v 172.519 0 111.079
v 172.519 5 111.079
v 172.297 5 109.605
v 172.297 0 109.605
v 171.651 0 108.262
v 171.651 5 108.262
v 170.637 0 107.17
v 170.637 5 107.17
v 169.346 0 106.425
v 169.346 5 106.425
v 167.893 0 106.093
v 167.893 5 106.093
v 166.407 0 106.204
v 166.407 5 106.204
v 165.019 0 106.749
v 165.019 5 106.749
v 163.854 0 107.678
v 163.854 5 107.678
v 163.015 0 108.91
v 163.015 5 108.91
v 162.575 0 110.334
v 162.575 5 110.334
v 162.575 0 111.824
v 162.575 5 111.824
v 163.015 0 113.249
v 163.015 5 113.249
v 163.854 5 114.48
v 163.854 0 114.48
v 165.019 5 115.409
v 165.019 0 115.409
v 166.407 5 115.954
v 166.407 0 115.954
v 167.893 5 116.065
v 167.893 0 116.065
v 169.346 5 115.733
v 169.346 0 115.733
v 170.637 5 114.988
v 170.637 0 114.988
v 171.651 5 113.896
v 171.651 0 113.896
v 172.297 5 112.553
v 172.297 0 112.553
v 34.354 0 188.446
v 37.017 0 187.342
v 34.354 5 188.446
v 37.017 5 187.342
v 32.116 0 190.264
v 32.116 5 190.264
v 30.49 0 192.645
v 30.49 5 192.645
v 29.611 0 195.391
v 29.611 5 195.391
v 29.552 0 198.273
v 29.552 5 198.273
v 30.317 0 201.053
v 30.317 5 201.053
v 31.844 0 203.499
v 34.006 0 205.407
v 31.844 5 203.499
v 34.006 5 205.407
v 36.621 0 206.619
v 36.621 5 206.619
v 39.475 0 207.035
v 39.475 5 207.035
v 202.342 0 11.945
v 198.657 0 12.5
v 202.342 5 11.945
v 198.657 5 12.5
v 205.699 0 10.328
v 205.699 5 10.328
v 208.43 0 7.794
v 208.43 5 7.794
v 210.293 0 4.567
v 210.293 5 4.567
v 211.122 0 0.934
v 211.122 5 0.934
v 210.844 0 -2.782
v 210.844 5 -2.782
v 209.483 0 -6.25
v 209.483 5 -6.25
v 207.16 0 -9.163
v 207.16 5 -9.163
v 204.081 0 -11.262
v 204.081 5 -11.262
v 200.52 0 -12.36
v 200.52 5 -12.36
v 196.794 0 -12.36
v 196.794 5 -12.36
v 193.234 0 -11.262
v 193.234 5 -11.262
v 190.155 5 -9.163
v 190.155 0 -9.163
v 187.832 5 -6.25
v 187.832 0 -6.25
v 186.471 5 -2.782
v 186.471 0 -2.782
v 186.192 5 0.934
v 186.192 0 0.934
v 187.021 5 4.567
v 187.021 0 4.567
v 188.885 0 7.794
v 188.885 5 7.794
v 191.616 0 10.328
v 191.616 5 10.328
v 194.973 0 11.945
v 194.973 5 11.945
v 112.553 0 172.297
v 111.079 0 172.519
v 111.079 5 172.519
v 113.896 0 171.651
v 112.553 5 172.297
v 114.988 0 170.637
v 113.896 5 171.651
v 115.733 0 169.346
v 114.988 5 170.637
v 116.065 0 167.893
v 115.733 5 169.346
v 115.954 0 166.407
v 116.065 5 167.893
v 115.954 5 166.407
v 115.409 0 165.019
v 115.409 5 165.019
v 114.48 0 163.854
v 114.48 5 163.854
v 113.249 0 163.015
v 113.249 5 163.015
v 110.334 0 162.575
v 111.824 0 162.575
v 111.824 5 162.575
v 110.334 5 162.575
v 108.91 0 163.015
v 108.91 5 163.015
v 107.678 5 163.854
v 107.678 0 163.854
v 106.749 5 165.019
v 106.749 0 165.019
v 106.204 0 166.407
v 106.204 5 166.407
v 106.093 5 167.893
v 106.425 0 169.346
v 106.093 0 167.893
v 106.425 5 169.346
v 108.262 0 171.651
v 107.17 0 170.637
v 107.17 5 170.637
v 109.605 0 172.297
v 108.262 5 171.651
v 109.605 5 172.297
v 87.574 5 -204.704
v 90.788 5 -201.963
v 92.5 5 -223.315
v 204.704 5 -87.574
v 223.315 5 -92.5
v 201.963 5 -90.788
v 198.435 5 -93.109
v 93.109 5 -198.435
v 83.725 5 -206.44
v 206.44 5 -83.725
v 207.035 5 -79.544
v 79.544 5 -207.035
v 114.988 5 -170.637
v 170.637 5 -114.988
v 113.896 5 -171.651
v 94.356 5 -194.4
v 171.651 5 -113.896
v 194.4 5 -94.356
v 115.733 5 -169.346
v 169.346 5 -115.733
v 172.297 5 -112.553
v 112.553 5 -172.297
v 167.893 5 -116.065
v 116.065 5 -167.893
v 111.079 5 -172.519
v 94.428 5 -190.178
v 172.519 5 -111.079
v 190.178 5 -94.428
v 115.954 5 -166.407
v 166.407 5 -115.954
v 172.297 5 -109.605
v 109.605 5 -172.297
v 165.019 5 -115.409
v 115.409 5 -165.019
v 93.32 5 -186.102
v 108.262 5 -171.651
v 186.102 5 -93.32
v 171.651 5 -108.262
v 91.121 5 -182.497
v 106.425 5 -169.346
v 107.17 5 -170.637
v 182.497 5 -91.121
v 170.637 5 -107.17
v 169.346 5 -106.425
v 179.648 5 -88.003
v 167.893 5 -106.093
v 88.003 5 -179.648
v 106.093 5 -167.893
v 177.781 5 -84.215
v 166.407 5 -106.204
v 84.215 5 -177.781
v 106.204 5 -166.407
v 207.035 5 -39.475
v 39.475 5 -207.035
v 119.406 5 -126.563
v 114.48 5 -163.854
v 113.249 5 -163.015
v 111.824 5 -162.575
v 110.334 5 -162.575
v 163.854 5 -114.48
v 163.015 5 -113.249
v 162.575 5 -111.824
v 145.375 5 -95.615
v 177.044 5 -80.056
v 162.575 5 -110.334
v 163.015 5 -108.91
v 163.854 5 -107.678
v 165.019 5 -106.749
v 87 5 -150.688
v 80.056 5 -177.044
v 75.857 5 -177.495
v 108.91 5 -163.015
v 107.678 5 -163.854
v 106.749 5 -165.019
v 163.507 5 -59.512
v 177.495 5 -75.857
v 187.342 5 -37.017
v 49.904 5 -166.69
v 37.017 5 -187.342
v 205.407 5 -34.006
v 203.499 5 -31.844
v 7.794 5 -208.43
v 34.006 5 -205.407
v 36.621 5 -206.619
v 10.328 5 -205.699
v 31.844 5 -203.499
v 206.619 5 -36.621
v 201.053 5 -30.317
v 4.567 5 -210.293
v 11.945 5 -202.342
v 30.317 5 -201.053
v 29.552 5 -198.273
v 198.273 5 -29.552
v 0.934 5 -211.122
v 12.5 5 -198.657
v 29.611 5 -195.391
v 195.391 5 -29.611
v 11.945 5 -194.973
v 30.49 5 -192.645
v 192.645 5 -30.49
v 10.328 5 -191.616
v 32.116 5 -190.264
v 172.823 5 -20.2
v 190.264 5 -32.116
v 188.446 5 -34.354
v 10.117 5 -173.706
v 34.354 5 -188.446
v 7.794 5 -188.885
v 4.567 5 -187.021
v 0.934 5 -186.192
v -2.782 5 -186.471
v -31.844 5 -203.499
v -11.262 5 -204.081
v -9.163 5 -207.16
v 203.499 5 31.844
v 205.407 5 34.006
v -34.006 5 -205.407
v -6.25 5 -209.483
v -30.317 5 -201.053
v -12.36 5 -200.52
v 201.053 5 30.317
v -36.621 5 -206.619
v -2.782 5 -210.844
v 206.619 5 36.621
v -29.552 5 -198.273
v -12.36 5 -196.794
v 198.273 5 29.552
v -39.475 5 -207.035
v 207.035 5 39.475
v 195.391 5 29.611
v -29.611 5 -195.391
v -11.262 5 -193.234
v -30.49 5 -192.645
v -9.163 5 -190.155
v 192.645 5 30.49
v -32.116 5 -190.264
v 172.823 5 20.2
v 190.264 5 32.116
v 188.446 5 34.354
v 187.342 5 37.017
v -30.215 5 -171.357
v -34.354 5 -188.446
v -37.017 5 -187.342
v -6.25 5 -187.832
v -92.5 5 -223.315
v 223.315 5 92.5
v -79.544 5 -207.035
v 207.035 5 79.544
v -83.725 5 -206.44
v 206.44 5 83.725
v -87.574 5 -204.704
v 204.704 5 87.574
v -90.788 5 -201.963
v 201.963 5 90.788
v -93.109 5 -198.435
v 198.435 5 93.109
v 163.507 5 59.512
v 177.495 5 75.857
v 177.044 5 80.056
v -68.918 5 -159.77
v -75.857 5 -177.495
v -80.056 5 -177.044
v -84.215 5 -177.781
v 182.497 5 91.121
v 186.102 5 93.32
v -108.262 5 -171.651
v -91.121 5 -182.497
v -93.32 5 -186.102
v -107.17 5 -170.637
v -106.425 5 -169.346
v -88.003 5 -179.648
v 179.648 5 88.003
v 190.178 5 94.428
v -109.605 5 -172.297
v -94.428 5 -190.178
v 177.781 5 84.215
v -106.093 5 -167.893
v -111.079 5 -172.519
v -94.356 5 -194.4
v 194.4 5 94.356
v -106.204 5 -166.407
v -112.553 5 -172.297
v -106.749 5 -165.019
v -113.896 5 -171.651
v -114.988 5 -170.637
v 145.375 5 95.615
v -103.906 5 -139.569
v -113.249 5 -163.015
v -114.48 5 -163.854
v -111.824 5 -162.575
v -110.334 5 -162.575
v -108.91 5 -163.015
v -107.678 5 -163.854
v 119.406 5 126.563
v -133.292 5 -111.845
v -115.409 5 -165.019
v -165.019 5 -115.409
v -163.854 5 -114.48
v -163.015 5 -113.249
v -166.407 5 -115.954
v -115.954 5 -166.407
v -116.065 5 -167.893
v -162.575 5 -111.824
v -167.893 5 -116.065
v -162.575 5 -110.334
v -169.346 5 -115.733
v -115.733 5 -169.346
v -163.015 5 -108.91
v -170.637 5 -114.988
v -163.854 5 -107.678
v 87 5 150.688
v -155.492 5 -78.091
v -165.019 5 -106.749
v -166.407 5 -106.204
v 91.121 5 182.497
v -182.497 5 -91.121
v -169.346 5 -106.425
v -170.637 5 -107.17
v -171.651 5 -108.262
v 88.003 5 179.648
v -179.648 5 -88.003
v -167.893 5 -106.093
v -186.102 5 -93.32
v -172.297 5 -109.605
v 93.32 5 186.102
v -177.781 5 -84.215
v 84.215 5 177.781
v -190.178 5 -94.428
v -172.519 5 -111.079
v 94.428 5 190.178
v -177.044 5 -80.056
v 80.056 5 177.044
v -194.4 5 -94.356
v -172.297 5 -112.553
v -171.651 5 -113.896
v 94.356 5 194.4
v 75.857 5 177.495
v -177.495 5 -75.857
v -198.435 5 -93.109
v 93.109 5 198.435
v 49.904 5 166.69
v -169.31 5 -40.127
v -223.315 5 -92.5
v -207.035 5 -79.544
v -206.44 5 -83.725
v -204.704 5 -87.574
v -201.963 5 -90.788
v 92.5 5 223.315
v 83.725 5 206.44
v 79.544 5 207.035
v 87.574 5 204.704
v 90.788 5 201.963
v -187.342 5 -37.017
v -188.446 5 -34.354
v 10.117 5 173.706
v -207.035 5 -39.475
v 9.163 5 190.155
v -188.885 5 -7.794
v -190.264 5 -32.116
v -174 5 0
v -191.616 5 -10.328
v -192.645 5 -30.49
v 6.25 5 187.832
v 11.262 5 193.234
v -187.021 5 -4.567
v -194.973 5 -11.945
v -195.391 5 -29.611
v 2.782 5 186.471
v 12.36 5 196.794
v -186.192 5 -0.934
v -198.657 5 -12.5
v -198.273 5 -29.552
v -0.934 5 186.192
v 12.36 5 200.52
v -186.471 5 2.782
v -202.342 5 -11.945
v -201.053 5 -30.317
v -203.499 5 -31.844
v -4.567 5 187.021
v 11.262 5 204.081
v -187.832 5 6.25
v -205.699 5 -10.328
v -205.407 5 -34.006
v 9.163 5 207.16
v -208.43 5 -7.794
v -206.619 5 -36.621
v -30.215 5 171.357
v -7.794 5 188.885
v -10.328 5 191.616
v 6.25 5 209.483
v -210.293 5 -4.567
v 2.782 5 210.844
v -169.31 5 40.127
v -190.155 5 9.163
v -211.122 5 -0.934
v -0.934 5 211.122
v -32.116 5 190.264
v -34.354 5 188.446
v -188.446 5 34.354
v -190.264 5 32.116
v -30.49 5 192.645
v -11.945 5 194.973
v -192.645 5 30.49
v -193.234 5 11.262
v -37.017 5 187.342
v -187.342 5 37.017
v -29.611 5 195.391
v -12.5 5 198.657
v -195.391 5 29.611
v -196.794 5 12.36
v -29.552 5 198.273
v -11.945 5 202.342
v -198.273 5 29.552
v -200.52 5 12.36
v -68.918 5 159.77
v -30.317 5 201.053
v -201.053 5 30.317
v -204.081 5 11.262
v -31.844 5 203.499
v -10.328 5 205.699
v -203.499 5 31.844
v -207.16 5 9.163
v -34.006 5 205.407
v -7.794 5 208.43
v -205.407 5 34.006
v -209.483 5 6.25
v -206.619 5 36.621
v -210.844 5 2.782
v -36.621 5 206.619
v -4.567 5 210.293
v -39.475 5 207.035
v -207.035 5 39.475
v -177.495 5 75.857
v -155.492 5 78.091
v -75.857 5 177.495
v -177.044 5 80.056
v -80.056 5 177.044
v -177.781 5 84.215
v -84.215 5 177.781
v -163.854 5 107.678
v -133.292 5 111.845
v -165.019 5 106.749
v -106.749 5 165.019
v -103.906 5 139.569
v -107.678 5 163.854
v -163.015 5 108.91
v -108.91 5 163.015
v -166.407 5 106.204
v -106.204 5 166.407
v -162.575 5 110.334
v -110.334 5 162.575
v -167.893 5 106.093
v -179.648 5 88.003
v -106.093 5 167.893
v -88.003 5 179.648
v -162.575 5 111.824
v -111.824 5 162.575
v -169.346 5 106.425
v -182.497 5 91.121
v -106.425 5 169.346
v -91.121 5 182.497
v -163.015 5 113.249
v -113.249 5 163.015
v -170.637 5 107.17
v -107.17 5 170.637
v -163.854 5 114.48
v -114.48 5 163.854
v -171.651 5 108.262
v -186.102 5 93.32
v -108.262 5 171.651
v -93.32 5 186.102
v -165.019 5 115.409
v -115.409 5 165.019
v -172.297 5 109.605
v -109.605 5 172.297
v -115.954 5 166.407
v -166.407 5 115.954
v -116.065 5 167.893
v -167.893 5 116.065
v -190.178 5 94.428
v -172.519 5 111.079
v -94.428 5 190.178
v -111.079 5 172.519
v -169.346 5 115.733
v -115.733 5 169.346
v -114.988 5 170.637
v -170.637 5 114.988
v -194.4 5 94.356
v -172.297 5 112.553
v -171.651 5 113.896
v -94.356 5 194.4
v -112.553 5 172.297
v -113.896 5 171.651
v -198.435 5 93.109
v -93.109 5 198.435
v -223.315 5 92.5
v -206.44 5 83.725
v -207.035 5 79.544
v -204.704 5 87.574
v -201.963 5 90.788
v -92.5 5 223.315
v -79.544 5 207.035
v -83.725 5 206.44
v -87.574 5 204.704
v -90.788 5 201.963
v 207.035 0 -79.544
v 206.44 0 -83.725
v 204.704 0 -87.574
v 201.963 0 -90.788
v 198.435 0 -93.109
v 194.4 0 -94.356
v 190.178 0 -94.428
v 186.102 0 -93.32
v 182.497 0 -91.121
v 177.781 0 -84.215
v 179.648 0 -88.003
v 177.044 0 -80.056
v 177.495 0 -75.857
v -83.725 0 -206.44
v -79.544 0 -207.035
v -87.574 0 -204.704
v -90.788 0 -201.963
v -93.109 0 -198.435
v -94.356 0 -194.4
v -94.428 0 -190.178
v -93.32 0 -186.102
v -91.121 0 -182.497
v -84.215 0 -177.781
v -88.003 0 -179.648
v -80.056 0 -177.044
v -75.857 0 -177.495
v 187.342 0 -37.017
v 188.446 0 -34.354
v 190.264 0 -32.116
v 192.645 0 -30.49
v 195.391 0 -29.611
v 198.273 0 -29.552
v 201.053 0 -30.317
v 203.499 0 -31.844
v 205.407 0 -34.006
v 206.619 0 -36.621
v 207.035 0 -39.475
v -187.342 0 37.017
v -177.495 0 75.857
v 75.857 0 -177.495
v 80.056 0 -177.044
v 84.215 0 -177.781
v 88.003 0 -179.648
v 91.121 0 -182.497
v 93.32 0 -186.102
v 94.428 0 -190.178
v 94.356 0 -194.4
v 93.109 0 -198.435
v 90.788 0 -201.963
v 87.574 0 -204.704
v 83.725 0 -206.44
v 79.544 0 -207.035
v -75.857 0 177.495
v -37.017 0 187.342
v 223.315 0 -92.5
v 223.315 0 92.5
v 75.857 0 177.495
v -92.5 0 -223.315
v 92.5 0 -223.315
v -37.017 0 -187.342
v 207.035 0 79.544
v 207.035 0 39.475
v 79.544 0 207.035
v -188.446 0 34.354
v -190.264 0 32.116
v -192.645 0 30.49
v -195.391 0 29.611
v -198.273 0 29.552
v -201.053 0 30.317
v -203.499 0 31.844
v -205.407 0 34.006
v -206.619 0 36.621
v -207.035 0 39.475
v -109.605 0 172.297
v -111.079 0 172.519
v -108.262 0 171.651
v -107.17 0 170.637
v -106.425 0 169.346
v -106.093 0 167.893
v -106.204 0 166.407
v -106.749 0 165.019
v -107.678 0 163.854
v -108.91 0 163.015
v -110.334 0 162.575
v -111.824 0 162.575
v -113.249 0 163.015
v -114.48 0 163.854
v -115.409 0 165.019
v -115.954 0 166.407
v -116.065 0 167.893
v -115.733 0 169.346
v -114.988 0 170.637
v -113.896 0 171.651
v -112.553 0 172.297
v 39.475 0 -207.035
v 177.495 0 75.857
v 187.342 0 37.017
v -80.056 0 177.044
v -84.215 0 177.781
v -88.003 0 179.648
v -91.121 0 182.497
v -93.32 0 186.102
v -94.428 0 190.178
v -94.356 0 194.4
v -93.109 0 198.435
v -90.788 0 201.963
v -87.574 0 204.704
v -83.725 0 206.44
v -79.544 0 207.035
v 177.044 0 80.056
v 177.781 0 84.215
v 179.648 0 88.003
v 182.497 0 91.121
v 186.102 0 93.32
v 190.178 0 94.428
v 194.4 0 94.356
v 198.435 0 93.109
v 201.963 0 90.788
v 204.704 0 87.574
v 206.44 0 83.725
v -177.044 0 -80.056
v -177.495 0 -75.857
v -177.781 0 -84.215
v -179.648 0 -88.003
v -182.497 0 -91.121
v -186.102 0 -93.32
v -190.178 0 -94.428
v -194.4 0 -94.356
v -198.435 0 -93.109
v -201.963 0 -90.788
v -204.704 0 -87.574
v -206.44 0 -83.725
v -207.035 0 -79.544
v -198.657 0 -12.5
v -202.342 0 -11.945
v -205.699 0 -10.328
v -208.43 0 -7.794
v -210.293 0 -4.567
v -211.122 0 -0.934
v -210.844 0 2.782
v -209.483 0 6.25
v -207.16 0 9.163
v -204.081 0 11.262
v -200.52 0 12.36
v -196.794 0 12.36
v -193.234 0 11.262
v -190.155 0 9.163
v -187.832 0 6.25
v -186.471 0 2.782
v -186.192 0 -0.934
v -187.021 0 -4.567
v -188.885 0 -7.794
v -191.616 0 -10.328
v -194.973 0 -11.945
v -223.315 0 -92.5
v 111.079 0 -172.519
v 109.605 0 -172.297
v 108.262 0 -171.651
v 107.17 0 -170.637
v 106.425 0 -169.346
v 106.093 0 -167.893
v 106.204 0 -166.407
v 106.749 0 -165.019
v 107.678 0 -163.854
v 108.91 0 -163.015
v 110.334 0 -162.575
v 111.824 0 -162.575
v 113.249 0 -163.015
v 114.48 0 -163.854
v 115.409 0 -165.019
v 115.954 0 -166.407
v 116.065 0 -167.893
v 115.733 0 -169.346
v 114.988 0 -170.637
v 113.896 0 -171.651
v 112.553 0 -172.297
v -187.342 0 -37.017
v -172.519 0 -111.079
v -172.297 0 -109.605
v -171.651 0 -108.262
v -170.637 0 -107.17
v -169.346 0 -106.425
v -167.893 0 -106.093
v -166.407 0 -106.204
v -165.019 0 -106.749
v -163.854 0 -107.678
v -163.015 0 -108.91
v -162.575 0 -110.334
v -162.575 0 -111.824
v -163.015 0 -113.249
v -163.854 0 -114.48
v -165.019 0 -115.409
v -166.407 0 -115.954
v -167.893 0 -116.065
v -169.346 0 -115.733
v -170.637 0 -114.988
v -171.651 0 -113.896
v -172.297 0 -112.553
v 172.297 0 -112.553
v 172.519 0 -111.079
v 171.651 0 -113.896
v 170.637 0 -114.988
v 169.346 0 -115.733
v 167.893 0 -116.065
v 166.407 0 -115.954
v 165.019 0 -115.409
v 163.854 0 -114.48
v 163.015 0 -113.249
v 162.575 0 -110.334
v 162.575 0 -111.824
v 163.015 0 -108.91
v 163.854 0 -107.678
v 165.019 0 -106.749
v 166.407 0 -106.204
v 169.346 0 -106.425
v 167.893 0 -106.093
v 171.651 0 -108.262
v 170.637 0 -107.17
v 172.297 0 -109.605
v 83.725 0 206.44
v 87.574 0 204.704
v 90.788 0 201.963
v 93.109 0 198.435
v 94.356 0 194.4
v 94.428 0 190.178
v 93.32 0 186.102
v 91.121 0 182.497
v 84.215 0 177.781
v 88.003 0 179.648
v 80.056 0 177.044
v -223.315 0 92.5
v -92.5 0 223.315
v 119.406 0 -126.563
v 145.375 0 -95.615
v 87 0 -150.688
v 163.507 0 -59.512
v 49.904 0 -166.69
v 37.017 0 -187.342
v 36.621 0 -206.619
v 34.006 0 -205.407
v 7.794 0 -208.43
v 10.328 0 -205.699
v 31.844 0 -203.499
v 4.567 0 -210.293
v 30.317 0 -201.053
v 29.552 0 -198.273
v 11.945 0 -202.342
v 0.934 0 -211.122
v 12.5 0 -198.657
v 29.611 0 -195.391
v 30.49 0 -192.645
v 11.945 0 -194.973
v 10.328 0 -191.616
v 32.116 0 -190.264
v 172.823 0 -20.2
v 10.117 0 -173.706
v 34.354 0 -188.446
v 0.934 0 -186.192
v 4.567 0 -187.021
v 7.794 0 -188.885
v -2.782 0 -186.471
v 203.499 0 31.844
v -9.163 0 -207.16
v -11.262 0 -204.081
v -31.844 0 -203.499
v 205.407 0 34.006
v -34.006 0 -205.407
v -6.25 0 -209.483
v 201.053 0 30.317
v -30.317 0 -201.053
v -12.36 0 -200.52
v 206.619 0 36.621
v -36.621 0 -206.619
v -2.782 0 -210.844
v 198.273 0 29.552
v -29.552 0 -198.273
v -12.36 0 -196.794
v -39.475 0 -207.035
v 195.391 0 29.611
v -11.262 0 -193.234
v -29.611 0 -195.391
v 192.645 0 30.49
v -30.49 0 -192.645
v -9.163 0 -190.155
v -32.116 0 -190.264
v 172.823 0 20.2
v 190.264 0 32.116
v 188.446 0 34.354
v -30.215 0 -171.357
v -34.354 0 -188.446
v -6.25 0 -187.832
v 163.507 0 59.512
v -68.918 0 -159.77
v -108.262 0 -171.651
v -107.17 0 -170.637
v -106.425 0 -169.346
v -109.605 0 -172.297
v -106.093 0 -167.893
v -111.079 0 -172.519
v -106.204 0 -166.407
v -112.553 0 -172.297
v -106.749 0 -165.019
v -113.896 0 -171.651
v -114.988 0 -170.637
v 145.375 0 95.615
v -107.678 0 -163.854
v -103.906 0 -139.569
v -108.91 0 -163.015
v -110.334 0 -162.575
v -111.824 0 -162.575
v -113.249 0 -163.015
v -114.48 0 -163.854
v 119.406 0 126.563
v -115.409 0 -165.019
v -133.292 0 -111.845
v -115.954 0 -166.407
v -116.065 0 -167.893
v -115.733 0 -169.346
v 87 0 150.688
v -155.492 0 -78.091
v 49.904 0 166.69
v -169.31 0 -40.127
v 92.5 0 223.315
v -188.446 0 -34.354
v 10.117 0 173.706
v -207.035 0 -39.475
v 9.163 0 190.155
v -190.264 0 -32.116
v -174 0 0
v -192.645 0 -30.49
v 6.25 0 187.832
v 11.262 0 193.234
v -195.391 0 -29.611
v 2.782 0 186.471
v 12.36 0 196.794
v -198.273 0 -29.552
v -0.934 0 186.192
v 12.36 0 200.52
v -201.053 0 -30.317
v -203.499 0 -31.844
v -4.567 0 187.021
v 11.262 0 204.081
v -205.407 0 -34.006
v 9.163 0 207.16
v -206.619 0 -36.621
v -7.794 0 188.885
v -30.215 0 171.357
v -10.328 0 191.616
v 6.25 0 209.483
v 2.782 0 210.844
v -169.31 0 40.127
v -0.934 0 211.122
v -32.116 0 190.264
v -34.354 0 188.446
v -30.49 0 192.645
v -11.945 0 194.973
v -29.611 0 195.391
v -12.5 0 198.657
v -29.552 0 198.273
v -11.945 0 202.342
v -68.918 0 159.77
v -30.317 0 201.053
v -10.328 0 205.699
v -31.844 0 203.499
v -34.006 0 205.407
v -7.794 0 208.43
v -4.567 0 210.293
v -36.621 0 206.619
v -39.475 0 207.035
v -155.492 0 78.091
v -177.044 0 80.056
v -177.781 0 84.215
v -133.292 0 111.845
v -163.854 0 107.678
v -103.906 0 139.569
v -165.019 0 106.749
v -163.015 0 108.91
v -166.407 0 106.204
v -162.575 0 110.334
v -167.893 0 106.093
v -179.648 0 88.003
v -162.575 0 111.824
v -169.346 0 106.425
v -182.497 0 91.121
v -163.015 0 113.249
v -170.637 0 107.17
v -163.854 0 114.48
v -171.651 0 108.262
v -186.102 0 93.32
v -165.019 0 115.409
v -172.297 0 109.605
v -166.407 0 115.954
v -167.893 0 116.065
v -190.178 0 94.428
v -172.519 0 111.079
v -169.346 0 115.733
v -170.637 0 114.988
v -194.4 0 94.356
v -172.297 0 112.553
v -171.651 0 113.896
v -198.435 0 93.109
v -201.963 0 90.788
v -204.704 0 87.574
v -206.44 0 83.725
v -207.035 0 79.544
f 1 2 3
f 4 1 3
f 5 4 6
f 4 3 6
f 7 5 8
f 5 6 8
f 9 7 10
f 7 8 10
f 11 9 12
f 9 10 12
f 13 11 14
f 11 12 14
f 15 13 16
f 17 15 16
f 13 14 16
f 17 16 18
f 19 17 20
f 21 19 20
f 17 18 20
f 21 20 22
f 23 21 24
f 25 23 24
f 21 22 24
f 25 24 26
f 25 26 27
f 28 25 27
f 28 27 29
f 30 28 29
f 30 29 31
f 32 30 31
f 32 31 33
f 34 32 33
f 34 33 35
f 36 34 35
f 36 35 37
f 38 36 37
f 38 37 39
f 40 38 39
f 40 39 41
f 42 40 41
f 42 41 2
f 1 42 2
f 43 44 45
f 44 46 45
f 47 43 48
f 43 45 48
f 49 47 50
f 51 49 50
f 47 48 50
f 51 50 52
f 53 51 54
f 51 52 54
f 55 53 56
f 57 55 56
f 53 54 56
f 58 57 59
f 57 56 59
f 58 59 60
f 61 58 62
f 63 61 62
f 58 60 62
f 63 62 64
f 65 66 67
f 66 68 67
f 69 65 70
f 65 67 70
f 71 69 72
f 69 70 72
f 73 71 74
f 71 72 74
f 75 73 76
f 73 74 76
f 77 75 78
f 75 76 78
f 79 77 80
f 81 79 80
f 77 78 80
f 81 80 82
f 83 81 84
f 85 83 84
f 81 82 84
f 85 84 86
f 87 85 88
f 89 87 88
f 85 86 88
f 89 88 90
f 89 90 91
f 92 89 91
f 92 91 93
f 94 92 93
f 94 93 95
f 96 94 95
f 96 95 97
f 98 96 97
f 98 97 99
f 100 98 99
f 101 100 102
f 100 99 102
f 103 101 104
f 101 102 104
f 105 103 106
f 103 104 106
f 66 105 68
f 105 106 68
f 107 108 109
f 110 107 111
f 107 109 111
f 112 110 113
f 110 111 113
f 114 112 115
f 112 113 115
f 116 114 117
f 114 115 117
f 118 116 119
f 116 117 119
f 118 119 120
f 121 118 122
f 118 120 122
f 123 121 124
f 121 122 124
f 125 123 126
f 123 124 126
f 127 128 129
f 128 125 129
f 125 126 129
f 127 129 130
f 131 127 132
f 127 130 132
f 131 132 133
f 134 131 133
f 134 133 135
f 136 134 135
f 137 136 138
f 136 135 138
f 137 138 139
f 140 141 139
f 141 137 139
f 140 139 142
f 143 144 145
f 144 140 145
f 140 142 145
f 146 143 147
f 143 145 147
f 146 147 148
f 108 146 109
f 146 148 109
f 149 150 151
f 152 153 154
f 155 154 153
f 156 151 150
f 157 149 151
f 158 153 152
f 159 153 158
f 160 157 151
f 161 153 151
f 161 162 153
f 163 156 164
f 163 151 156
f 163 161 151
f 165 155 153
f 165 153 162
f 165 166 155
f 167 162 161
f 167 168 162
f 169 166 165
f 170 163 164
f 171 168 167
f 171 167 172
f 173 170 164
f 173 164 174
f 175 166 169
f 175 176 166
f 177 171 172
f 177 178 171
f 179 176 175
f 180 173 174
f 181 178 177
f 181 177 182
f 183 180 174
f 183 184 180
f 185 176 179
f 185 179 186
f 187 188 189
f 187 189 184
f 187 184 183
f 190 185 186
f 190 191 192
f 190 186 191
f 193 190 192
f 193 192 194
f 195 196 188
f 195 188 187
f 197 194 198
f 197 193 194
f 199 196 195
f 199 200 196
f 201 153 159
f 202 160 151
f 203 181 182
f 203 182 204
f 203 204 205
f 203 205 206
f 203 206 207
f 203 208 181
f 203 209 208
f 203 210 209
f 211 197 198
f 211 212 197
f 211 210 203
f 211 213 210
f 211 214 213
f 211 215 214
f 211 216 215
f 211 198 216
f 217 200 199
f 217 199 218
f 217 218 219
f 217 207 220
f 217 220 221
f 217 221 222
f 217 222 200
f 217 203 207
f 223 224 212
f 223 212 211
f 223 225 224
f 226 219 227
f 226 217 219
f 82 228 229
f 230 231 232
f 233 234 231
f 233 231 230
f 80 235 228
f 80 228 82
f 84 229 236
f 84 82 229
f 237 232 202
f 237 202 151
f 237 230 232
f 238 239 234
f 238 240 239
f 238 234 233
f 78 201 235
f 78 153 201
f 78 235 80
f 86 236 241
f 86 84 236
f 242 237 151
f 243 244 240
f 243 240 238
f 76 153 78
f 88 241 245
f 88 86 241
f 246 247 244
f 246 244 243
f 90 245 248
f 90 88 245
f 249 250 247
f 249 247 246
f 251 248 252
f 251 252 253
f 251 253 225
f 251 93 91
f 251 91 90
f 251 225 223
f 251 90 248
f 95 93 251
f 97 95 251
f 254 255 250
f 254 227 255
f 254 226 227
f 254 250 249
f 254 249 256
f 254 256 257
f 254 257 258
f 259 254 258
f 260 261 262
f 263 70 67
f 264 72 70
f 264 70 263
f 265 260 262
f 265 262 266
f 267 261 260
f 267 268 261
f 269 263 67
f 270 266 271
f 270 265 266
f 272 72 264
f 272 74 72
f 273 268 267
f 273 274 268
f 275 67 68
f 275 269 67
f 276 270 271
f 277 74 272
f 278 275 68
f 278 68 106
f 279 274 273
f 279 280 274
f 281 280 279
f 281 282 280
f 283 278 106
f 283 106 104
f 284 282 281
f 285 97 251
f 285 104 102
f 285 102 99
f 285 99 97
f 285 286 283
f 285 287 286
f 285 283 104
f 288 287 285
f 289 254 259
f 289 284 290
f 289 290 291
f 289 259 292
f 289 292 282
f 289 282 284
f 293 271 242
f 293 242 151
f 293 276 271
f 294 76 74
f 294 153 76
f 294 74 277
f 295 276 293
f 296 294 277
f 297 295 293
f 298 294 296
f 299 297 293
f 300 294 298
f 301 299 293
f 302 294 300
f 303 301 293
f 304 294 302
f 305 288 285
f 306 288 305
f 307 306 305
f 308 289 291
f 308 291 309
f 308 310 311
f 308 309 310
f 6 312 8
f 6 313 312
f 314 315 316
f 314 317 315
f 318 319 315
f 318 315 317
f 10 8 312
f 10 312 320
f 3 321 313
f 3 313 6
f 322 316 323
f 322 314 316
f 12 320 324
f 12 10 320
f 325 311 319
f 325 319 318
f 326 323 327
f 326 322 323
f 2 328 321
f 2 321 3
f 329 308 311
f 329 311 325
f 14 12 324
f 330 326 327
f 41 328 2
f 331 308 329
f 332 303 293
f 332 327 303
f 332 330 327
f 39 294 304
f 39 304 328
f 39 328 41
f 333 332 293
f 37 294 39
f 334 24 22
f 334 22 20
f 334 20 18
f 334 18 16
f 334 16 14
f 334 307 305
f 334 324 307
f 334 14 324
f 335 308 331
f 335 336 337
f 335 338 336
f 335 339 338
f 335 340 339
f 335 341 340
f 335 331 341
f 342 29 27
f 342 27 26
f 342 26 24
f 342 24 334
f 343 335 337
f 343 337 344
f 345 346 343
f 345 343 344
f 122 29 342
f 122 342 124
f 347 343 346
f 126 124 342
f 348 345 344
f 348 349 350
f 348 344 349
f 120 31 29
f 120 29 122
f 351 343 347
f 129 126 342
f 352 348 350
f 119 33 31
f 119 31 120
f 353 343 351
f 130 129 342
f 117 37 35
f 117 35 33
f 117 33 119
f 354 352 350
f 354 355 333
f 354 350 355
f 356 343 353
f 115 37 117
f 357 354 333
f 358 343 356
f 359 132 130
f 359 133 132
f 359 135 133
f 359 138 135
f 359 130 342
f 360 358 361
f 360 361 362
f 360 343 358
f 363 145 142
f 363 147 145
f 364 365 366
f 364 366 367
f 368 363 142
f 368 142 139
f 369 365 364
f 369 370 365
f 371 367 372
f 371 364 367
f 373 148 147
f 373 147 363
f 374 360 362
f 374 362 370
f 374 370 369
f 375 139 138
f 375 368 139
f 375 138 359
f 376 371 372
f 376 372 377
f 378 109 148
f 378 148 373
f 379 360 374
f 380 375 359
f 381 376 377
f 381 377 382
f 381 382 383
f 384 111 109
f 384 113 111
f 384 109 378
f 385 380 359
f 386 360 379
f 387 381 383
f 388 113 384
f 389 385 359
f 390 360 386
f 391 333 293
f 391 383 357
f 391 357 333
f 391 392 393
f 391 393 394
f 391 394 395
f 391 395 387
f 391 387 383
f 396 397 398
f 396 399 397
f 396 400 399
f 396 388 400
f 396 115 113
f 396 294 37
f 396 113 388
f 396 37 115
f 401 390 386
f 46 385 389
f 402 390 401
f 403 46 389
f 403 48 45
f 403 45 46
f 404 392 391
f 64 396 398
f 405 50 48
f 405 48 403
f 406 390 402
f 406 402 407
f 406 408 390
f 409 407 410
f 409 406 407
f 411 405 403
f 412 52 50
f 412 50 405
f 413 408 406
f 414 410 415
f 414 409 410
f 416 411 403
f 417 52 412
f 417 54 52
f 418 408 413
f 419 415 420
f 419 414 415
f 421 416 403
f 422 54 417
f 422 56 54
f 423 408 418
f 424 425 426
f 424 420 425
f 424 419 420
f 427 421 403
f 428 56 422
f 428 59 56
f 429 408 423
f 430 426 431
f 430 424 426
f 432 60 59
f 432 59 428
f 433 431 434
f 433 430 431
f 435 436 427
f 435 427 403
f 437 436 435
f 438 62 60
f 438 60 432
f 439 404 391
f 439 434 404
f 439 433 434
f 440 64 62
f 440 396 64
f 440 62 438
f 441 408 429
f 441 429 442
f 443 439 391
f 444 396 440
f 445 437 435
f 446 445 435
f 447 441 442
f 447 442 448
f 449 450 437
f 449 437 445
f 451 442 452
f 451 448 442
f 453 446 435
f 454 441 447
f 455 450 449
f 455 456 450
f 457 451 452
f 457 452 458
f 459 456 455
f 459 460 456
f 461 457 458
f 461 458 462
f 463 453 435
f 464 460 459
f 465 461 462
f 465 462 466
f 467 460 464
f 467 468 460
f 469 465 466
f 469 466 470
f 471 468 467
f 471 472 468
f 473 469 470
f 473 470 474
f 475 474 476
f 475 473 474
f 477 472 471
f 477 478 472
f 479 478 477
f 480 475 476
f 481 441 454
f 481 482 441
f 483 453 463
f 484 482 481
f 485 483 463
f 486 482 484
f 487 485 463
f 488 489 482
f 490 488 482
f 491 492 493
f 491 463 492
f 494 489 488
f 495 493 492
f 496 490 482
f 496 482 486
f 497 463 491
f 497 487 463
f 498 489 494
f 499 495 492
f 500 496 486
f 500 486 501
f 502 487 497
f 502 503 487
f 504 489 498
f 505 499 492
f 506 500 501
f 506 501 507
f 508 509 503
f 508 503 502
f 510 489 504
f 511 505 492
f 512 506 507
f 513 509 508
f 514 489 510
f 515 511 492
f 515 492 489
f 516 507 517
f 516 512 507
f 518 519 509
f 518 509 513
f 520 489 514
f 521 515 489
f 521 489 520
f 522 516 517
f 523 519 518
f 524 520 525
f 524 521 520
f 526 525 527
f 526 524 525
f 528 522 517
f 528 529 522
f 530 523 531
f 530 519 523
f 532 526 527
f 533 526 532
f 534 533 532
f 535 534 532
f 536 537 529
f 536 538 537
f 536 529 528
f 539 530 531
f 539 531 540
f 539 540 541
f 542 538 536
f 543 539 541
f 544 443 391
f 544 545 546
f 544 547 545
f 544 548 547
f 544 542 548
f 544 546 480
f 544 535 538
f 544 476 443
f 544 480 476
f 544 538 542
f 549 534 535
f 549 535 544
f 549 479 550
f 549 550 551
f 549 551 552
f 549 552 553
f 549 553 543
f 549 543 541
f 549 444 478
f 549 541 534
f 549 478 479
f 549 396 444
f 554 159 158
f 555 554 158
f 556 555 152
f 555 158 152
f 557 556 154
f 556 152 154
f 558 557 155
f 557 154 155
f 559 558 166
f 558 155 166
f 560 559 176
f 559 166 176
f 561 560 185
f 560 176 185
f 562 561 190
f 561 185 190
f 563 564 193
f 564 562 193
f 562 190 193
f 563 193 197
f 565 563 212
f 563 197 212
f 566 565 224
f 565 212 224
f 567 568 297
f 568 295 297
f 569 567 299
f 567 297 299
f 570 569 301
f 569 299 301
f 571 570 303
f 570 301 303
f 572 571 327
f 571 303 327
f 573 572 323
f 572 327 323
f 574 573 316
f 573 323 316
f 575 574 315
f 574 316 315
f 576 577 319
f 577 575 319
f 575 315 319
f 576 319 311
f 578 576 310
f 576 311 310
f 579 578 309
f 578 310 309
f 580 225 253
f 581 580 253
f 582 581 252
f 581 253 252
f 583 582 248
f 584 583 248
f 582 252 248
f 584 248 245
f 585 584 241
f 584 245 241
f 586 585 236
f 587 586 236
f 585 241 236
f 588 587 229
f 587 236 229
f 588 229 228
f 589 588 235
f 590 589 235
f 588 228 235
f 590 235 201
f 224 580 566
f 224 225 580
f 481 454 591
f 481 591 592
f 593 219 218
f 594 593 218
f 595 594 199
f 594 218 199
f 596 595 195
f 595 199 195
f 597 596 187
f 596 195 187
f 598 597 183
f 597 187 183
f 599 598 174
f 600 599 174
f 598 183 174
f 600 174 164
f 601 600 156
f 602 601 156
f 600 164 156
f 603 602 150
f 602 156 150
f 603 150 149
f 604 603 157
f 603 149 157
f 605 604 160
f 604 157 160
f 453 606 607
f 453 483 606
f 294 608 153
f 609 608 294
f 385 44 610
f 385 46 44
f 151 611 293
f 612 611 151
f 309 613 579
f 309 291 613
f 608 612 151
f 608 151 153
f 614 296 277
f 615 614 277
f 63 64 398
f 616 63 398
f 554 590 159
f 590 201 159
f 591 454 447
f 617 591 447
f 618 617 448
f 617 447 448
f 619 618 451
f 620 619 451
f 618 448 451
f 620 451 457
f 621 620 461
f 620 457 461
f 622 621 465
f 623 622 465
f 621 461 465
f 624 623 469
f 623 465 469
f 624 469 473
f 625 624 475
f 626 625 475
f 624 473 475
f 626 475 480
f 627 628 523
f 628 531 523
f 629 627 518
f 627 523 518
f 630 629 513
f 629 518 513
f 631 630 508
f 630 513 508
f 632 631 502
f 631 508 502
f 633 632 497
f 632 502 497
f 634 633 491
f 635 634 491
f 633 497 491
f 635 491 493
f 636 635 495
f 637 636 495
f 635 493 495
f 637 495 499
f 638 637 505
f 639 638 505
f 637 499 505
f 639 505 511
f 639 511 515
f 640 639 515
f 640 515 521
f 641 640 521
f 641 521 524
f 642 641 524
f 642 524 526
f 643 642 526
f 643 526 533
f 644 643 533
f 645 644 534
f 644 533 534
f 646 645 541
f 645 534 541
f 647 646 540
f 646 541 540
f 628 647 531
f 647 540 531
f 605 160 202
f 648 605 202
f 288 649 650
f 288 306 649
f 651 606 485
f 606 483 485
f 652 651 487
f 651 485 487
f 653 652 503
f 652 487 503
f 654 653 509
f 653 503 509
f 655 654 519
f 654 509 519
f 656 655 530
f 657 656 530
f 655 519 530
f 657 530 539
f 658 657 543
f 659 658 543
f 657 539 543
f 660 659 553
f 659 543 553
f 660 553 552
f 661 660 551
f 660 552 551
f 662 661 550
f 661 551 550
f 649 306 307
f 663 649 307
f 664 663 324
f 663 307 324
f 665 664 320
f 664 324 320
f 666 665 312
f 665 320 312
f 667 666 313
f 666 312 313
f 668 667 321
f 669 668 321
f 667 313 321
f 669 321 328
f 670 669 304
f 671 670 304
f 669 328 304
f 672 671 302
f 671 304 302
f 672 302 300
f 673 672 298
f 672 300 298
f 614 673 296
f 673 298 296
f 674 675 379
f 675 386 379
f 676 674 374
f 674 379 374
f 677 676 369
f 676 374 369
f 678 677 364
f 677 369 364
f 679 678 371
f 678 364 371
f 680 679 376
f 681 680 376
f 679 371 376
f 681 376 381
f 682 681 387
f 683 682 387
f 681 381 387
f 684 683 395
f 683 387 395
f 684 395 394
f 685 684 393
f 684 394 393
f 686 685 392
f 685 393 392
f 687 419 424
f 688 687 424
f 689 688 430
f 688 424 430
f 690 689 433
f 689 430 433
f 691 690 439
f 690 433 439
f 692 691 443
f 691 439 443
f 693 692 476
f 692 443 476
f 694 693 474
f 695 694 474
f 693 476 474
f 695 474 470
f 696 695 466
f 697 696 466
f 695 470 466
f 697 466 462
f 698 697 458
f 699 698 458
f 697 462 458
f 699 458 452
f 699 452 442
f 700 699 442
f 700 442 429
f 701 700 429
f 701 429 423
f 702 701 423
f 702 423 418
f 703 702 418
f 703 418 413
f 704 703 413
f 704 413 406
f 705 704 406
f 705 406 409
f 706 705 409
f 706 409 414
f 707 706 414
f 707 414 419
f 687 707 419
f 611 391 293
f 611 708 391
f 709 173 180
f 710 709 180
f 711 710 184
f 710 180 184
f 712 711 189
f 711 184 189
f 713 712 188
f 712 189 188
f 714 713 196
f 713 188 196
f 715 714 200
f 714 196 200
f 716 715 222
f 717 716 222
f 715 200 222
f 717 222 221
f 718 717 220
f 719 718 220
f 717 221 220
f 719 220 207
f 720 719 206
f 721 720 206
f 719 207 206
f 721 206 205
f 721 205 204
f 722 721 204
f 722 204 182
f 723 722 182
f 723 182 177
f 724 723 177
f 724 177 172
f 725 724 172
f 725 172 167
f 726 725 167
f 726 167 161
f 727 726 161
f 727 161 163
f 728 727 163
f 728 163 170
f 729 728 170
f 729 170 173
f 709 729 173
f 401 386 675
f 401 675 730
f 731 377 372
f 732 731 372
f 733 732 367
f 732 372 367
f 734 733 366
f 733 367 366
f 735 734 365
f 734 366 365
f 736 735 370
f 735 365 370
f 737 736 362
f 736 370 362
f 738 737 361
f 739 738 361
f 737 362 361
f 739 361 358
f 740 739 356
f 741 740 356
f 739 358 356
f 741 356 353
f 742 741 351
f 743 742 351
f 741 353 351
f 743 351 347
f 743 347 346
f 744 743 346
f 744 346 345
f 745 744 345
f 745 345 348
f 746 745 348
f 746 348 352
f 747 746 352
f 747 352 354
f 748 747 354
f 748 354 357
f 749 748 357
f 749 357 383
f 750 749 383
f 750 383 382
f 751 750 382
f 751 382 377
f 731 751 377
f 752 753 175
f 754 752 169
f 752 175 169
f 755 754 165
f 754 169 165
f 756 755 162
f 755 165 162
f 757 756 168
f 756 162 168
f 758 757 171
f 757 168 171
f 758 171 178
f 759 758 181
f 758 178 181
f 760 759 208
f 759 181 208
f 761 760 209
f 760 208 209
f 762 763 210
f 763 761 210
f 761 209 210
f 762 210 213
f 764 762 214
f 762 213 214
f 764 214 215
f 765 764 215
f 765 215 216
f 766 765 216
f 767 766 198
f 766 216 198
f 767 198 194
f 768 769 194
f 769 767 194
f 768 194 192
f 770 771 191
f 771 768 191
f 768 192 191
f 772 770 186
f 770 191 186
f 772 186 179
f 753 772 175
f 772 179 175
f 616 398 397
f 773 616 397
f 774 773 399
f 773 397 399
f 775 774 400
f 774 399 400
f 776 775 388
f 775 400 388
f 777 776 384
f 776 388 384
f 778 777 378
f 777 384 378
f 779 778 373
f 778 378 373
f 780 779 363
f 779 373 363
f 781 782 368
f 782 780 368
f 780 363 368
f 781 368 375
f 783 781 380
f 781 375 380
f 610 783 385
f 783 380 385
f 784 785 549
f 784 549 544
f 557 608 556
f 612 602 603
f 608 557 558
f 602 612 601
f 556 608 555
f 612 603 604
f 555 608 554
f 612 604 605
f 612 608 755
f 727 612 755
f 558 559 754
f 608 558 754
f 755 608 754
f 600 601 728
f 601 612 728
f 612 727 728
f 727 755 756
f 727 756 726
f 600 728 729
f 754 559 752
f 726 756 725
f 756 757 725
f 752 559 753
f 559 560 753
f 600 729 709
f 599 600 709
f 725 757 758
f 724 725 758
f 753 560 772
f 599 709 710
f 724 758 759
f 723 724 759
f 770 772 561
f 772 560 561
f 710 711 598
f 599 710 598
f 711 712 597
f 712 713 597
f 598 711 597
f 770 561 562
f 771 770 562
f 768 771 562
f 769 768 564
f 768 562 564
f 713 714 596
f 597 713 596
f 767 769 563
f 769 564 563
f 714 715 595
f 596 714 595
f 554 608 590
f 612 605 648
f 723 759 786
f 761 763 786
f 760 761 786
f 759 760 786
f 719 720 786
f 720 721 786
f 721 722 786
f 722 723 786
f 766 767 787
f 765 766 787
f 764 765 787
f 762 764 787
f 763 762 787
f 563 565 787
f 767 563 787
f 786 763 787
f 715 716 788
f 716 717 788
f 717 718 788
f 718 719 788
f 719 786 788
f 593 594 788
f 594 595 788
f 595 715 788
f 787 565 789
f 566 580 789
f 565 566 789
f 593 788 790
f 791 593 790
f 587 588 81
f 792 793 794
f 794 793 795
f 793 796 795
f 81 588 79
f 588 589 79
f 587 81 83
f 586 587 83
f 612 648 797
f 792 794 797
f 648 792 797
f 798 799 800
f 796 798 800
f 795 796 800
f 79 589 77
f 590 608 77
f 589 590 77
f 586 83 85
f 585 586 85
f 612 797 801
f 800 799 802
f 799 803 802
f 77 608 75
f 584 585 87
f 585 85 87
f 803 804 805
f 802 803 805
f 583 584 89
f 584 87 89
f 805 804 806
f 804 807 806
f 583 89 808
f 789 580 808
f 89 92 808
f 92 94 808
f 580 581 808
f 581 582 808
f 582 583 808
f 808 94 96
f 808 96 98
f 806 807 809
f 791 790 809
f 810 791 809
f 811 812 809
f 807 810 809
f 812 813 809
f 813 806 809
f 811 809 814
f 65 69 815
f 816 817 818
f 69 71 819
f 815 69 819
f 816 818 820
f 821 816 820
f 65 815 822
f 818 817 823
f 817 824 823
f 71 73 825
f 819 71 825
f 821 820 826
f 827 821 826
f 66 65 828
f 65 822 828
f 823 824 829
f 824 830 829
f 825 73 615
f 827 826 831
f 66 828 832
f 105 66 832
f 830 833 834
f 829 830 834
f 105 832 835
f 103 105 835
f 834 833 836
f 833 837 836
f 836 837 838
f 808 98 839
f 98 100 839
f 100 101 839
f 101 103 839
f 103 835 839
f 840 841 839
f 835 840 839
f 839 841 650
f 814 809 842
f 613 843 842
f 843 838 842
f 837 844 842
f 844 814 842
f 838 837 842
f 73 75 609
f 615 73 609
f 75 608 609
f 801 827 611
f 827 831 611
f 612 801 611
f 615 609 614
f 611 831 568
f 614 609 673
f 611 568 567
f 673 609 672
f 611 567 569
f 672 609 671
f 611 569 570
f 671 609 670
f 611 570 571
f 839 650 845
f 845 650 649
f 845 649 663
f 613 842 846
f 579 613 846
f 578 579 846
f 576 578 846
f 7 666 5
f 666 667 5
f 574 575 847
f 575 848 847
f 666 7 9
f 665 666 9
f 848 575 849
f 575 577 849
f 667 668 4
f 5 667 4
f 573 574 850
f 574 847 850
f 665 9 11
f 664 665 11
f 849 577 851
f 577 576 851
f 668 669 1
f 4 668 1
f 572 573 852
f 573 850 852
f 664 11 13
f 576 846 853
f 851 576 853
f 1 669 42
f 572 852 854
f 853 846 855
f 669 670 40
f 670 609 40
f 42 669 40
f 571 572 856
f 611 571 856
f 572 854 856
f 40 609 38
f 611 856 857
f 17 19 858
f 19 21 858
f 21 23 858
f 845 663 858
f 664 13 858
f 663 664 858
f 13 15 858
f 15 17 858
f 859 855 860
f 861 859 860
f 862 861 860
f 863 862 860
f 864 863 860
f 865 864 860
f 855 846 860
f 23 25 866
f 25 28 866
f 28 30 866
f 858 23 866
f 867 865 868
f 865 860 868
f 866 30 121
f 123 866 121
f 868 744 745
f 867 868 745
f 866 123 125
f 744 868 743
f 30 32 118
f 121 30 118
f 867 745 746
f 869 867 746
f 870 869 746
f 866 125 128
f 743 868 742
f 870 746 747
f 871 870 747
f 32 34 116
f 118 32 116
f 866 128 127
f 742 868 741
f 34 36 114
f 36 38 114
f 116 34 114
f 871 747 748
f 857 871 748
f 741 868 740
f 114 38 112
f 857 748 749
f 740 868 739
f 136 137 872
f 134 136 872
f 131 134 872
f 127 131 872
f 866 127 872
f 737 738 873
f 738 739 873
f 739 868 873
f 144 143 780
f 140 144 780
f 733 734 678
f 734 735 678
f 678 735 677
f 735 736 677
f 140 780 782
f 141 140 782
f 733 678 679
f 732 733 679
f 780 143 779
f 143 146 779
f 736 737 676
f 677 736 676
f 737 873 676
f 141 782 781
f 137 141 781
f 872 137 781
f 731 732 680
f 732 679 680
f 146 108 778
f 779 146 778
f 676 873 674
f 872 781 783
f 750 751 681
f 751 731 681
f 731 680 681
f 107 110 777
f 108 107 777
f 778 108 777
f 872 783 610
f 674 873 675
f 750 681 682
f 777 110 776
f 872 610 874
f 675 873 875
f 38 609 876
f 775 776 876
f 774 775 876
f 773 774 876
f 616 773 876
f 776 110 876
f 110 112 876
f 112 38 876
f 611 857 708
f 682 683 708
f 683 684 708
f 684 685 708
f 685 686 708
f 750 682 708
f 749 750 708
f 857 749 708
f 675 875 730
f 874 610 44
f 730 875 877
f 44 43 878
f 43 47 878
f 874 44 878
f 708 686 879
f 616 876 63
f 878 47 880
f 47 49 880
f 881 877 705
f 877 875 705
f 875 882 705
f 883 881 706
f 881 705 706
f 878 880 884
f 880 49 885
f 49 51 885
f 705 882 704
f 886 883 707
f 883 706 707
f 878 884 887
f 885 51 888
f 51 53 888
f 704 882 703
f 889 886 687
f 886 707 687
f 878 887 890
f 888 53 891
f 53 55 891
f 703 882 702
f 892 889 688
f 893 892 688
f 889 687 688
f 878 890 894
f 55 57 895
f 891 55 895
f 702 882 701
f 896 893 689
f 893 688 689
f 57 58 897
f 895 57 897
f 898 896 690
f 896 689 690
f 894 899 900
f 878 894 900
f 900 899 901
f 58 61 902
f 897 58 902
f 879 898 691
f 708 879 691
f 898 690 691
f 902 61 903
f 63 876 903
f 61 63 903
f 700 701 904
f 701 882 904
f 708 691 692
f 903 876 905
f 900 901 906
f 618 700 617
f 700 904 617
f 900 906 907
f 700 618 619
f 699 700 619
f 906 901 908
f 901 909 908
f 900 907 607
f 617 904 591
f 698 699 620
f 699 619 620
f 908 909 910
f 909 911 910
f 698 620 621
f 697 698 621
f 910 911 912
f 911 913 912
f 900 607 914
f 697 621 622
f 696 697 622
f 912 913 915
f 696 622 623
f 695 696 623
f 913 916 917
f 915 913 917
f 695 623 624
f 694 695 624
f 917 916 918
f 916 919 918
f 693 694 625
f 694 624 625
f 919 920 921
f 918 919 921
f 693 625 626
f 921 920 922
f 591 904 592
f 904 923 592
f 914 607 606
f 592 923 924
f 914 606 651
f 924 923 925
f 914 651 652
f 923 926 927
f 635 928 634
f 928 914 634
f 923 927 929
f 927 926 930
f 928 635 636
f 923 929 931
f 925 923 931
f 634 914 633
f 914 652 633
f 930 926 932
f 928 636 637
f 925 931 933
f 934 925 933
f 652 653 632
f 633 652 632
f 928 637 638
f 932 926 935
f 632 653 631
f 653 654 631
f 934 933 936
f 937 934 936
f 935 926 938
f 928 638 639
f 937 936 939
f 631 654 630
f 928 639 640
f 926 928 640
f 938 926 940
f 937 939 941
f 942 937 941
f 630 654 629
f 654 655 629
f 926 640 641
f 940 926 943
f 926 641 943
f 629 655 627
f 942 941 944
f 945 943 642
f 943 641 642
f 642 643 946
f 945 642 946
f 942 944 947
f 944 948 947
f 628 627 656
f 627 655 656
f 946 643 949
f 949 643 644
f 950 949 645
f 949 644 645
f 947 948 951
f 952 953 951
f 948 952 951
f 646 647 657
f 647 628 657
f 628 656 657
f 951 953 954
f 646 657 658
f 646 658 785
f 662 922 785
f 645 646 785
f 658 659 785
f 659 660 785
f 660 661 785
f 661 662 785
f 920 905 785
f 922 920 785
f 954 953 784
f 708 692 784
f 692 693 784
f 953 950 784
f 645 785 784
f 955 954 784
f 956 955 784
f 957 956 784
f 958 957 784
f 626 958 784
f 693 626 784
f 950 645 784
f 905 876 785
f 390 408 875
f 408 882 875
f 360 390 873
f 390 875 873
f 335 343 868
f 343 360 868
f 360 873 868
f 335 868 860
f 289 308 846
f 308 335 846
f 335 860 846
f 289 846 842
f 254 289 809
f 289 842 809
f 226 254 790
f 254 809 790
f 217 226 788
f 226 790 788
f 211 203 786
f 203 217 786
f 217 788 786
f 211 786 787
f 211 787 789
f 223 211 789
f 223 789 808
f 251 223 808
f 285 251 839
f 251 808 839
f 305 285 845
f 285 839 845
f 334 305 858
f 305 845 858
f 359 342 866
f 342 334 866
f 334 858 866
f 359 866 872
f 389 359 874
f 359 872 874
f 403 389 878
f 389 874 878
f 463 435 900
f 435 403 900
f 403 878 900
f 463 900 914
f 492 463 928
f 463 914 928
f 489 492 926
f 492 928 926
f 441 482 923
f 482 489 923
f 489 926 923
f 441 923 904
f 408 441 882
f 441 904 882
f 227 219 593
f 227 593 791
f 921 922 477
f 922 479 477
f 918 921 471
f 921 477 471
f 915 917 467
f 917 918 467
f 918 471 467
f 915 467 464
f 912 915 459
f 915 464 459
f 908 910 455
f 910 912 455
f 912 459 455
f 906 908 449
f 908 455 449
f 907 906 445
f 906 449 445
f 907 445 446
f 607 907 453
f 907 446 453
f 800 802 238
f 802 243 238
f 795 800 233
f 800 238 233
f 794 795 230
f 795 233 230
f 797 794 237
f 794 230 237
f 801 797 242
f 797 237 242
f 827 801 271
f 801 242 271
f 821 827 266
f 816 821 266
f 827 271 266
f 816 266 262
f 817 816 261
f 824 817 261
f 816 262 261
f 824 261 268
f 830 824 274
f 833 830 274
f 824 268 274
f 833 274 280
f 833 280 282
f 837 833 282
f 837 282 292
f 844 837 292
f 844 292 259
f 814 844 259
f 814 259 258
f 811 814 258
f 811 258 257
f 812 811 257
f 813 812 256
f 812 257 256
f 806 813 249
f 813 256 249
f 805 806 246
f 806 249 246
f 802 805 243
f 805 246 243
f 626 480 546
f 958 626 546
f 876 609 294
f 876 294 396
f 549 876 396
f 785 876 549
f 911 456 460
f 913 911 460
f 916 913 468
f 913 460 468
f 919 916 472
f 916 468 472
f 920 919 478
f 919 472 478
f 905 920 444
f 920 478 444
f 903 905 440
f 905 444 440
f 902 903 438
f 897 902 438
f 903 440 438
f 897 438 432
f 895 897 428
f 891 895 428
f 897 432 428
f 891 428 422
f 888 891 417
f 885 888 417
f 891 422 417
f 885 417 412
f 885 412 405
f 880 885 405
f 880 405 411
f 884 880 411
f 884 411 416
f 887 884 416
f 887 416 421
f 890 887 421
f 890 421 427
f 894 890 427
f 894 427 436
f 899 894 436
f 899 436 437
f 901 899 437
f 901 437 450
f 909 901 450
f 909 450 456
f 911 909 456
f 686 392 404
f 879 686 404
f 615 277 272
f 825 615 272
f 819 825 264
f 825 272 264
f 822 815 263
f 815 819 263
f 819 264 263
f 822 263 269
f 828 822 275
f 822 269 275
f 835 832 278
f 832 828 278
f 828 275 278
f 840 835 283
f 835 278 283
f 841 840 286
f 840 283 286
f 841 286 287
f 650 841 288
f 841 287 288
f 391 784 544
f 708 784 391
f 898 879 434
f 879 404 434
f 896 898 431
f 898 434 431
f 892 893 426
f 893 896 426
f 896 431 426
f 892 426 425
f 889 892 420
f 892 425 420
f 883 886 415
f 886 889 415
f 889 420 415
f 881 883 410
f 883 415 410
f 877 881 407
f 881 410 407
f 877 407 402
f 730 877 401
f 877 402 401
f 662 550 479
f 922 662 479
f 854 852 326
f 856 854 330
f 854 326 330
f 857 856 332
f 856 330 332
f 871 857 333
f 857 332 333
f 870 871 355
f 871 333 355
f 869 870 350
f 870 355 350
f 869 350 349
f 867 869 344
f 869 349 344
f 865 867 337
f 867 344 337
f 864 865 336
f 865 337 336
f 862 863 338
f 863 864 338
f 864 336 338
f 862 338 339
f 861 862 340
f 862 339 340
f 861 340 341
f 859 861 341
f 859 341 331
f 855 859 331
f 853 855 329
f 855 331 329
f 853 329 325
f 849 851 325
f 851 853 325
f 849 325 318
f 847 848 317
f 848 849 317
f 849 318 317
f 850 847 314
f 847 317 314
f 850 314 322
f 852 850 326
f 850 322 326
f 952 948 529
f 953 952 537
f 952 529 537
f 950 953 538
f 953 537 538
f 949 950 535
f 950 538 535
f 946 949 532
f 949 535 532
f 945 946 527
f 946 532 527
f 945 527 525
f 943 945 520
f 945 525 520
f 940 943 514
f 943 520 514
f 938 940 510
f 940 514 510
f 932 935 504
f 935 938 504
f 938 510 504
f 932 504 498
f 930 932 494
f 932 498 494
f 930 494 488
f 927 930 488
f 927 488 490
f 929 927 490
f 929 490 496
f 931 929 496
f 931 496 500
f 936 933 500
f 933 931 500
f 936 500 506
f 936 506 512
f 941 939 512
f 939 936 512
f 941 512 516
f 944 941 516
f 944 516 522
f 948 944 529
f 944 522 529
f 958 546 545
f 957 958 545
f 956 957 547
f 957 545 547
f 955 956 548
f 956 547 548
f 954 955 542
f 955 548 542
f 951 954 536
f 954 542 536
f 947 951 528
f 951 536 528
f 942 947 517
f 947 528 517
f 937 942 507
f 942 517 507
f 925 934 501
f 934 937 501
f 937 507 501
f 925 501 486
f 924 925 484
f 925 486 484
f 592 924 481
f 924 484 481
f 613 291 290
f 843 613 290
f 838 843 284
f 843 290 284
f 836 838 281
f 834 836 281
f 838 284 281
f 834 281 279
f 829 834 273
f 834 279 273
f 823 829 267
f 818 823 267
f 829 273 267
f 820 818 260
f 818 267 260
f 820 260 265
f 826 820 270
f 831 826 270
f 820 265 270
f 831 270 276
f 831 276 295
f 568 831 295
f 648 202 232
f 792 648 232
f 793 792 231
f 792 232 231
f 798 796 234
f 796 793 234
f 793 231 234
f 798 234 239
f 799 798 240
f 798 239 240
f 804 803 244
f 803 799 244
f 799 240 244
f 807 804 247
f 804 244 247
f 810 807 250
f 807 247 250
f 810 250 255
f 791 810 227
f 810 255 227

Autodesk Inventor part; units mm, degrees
ref_plane "YZ Plane" through (0, 0, 0) normal (1, 0, 0) x (0, 1, 0)
ref_plane "XZ Plane" through (0, 0, 0) normal (0, 1, 0) x (-1, 0, 0)
ref_plane "XY Plane" through (0, 0, 0) normal (0, 0, 1) x (1, 0, 0)
sketch "Sketch1" plane through (0, 0, 0) normal (0, 1, 0) x (-1, 0, 0)
  line L0 (-92.5, -223.3148) -> (-223.3148, -92.5)
  line L1 (-223.3148, -92.5) -> (-223.3148, 92.5)
  line L2 (-223.3148, 92.5) -> (-92.5, 223.3148)
  line L3 (-92.5, 223.3148) -> (92.5, 223.3148)
  line L4 (92.5, 223.3148) -> (223.3148, 92.5)
  line L5 (223.3148, 92.5) -> (223.3148, -92.5)
  line L6 (223.3148, -92.5) -> (92.5, -223.3148)
  line L7 (92.5, -223.3148) -> (-92.5, -223.3148)
  circle A0 centre (0, 0) radius 46
  circle A1 centre (0, 0) radius 174
  dimension "d0" = 185
  dimension "d1" = 128
  dimension "d2" = 92
extrude "Extrusion1" add sketch "Sketch1" along normal blind 5
sketch "Sketch4" plane through (0, 5, 0) normal (0, 1, 0) x (1, 0, 0)
  circle A0 centre (0, 0) radius 174 projected
  line L0 (0, 174) -> (0, 223.3148)
  line L1 (92.5, 223.3148) -> (-92.5, 223.3148) projected
  circle A1 centre (0, 198.6574) radius 12.5
  dimension "d10" = 25
extrude "Extrusion4" cut sketch "Sketch4" against normal blind 5 contours A1 L0 | L0 A1
pattern_circular "Circular Pattern1" count 4 over 360 about axis through (0, -10, 0) along (0, 1, 0) of "Extrusion4"
sketch "Sketch5" plane through (0, 5, 0) normal (0, 1, 0) x (1, 0, 0)
  line L0 (-223.3148, -92.5) -> (-92.5, -223.3148) projected
  line L1 (-92.5, -223.3148) -> (-66.5869, -160.755)
  circle A0 centre (0, 0) radius 174 projected
  circle A1 centre (-79.5435, -192.0349) radius 15
  line L2 (-92.5, -223.3148) -> (92.5, -223.3148) projected
  circle A2 centre (0, -198.6574) radius 12.5 projected
  line L3 (0, -211.1574) -> (0, -186.1574)
  line L4 (-44.7395, -223.3148) -> (-34.1805, -170.6098)
  line L5 (92.5, -223.3148) -> (223.3148, -92.5) projected
  line L6 (92.5, -223.3148) -> (66.5869, -160.755)
  circle A3 centre (79.5435, -192.0349) radius 15
  arc A4 (-79.5435, -192.0349) -> (79.5435, -192.0349) centre (0, 282.3572) ccw
  circle A5 centre (-39.4746, -197.0349) radius 10
  circle A6 centre (39.4746, -197.0349) radius 10
  line L7 (-79.5435, -207.0349) -> (-39.4746, -207.0349)
  line L8 (-79.5435, -192.0349) -> (-39.4746, -197.0349)
  line L9 (-75.8573, -177.4949) -> (-37.0171, -187.3415)
  dimension "d16" = 30
  dimension "d18" = 20
  dimension "d17" = 30
extrude "Extrusion5" cut sketch "Sketch5" against normal blind 5 contours A1 L1 | L1 A4 A1 | L8 A1 A4 | L1 A1 L8 | L9 L1 A1 | A1 A4 A5 L4 L7 | L4 A5 L7 | L1 L9 L4 A5 L8 A1 | A1 L8 A5 A4 | A5 A4 L4 | L4 A4 A5 | A5 L8 A4 | A5 L4 L8 | L9 A5 L4 | L4 A5 A4
mirror "Mirror1" about plane through (0, 0, 0) normal (1, 0, 0) of "Extrusion5"
pattern_circular "Circular Pattern2" count 4 over 360 about axis through (0, -10, 0) along (0, 1, 0) of "Extrusion5", "Mirror1"
sketch "Sketch6" plane through (0, 5, 0) normal (0, 1, 0) x (1, 0, 0)
  arc A0 (177.4949, -75.8573) -> (207.0349, -79.5435) centre (192.0349, -79.5435) ccw projected
  line L0 (207.0349, -79.5435) -> (207.0349, -39.4746) projected
  line L1 (207.0349, -79.5435) -> (177.0349, -79.5435)
  arc A1 (79.5435, -207.0349) -> (75.8573, -177.4949) centre (79.5435, -192.0349) ccw projected
  line L2 (75.8573, -177.4949) -> (79.5435, -192.0349)
  line L3 (0, 0) -> (79.5435, -79.5435)
  line L4 (92.5, -223.3148) -> (223.3148, -92.5) projected
  line L5 (92.5, -223.3148) -> (223.3148, -92.5) projected
  line L6 (79.5435, -79.5435) -> (157.9074, -157.9074)
  circle A2 centre (0, 0) radius 174 projected
  line L7 (123.0366, -123.0366) -> (157.9074, -157.9074)
  arc A3 (79.5435, -192.0349) -> (140.472, -140.472) centre (-199.6567, 199.6567) ccw
  arc A4 (140.472, -140.472) -> (192.0349, -79.5435) centre (-199.6567, 199.6567) ccw
  circle A5 centre (167.5194, -111.0791) radius 5
  dimension "d26" = 10
  dimension "d27" = 481.0145
extrude "Extrusion6" cut sketch "Sketch6" against normal blind 5 contours A5 A4 | A4 A5
mirror "Mirror2" about plane through (0, 0, 0) normal (0, 0, 1) of "Extrusion6"
pattern_circular "Circular Pattern3" count 4 over 360 about axis through (0, -10, 0) along (0, 1, 0) of "Extrusion6", "Mirror2"
sketch "Sketch7" plane through (0, 5, 0) normal (0, 1, 0) x (1, 0, 0)
  arc A0 (207.0349, 79.5435) -> (177.4949, 75.8573) centre (192.0349, 79.5435) ccw projected
  circle A1 centre (198.6574, 0) radius 12.5 projected
  line L0 (186.1574, 0) -> (198.6574, 0)
  arc A2 (187.3415, 37.0171) -> (207.0349, 39.4746) centre (197.0349, 39.4746) ccw projected
  line L1 (187.3415, 37.0171) -> (197.0349, 39.4746)
  line L2 (198.6574, 0) -> (197.0349, 39.4746)
  point P0 (0, 0)
  dimension "d33" = 39.4746
sketch "Sketch11" plane through (0, 5, 0) normal (0, 1, 0) x (1, 0, 0)
  circle A0 centre (0, 0) radius 50
  dimension "d44" = 100
extrude "Extrusion10" cut sketch "Sketch11" against normal blind 10
properties part number "Telescope_Base"
